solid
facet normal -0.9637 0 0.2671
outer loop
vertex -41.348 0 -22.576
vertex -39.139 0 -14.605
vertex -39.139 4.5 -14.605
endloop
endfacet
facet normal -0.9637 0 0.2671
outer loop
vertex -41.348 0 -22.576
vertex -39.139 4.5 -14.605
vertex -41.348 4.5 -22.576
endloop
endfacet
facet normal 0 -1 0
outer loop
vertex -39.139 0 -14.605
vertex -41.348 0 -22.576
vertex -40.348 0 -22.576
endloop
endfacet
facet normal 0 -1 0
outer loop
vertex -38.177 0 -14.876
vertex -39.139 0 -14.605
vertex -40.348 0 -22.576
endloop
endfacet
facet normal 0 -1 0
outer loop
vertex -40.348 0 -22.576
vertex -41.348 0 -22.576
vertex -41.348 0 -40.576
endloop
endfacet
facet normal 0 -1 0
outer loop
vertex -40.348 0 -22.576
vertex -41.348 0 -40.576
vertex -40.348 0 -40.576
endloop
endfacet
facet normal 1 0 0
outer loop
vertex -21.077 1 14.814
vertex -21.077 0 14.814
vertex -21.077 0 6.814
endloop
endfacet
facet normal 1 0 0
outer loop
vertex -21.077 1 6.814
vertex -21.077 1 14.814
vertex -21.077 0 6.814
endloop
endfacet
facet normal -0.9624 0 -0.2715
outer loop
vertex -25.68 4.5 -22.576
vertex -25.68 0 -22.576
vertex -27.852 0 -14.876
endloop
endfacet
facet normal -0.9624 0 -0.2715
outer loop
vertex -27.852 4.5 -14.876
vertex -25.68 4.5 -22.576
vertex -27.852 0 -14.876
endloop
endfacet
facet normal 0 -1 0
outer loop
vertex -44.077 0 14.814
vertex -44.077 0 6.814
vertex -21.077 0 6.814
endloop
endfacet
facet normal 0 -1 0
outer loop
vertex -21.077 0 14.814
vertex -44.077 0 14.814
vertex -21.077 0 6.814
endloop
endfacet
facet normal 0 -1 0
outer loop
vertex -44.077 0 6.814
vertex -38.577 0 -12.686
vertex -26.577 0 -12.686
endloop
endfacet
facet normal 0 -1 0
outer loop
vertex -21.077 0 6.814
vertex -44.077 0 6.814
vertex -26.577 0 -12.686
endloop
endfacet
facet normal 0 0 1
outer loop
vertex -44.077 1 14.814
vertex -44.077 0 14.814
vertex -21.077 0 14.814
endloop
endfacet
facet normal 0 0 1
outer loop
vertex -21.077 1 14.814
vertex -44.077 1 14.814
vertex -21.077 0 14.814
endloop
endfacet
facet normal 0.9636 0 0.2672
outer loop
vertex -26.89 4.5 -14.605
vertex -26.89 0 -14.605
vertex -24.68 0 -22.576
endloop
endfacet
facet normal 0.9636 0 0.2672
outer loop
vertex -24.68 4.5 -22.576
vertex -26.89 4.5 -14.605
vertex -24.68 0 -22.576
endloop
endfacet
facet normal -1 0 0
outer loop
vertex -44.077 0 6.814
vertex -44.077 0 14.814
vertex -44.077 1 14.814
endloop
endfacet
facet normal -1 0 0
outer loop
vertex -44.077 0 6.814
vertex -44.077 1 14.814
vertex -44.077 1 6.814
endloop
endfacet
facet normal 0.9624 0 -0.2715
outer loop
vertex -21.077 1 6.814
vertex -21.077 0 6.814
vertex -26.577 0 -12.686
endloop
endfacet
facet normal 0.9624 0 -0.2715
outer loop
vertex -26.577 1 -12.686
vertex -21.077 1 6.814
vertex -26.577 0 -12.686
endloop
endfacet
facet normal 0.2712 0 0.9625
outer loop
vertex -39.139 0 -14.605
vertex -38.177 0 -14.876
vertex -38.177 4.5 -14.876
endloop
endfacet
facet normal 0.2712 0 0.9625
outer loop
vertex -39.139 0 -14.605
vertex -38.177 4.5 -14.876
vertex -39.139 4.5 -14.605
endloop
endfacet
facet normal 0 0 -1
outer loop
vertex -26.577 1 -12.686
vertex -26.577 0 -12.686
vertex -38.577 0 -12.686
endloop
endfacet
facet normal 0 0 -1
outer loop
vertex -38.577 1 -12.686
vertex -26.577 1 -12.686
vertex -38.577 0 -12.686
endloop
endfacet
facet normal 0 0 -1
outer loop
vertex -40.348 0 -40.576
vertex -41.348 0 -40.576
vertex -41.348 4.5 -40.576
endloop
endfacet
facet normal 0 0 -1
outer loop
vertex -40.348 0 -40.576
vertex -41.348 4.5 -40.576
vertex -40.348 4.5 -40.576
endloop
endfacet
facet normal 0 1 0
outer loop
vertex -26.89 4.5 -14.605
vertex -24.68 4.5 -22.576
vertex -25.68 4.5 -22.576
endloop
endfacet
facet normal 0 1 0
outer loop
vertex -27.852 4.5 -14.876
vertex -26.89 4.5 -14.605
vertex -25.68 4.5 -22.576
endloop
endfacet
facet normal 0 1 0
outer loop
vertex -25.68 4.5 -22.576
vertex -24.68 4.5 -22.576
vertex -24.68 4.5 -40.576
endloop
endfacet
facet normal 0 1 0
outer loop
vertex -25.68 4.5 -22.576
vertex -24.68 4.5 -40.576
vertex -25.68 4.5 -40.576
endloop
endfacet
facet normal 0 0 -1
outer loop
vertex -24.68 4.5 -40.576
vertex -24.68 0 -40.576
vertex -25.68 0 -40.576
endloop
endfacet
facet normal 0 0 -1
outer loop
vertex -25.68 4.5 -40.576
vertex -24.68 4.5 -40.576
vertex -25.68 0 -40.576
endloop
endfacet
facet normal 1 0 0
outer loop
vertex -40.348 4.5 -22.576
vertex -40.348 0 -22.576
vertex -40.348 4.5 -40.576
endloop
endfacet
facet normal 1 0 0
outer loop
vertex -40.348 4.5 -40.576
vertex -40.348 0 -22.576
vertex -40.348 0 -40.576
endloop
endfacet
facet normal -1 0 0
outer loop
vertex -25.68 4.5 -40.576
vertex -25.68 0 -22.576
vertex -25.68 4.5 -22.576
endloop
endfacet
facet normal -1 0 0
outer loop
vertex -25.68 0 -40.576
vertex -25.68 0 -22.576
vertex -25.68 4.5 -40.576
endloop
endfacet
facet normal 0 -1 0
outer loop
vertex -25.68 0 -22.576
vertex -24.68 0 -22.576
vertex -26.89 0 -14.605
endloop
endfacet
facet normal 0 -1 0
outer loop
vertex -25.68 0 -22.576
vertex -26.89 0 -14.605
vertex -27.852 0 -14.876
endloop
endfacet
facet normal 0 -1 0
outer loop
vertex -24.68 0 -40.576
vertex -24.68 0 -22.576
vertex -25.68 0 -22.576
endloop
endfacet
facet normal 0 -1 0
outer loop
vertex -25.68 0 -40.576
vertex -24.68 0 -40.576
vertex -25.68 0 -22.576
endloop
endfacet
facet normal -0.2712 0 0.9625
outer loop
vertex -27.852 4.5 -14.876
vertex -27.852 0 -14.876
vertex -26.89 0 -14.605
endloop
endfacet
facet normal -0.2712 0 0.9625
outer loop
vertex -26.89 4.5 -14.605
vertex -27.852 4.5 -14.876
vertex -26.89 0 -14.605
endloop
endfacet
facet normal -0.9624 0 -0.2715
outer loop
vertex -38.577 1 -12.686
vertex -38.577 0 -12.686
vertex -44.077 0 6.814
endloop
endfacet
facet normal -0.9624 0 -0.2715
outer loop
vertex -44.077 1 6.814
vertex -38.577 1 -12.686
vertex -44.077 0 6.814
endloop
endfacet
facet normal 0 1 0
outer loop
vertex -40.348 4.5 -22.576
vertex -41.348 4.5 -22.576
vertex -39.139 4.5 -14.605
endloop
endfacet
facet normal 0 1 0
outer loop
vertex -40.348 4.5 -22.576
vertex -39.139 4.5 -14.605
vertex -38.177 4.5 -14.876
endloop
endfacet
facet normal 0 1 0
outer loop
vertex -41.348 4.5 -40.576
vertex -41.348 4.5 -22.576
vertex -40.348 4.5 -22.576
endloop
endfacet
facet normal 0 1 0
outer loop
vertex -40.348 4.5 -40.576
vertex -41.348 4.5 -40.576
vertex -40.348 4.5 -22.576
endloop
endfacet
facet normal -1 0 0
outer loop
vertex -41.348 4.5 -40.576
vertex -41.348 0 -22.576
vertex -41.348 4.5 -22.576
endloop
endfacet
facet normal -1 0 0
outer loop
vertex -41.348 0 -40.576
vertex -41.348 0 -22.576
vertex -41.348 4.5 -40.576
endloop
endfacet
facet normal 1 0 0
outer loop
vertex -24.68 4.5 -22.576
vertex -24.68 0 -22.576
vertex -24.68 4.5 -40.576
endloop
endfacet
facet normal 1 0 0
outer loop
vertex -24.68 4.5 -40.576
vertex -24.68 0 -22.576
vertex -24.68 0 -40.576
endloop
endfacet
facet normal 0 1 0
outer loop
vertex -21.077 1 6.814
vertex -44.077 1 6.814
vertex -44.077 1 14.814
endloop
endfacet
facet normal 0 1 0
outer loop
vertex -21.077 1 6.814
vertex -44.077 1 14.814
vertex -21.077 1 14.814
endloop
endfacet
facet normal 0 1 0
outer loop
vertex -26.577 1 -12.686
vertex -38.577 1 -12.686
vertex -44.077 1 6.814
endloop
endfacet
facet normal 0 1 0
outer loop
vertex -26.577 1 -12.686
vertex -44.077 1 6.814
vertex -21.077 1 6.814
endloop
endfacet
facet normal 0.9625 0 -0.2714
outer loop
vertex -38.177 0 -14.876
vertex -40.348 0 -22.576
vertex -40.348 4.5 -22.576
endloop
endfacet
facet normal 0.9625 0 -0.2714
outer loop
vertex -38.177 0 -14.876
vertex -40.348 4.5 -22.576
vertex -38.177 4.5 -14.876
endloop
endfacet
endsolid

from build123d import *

# Parameters (mm, degrees)
SKETCH1_W           = 11.5
SKETCH1_H           = 8
BOSS_EXTRUDE1_DEPTH = 1
SKETCH3_W           = 1
SKETCH3_H           = 18
BOSS_EXTRUDE2_DEPTH = 4.5


with BuildPart() as part:
    # Sketch1 → Boss-Extrude1 (new body)
    with BuildSketch(Plane(origin=(0, 0, 0), x_dir=(1, 0, 0), z_dir=(0, 1, 0))):
        Polygon((-38.577353254, 12.685924323), (-44.077353254, -6.814075677), (-32.577353254, -6.814075677), (-32.577353254, 12.685924323), align=None)
        Polygon((-32.577353254, 12.685924323), (-32.577353254, -6.814075677), (-21.077353254, -6.814075677), (-26.577353254, 12.685924323), align=None)
        with Locations((-26.827353254, -10.814075677)):
            Rectangle(SKETCH1_W, SKETCH1_H)
        with Locations((-38.327353254, -10.814075677)):
            Rectangle(SKETCH1_W, SKETCH1_H)
    extrude(amount=BOSS_EXTRUDE1_DEPTH)


with BuildPart() as body_2:
    # Sketch3 → Boss-Extrude2 (new body)
    with BuildSketch(Plane(origin=(0, 0, 0), x_dir=(1, 0, 0), z_dir=(0, 1, 0))):
        with Locations((-40.84836488, 31.575836794)):
            Rectangle(SKETCH3_W, SKETCH3_H)
        Polygon((-39.139133236, 14.604779221), (-41.34836488, 22.575836794), (-40.34836488, 22.575836794), (-38.17668356, 14.876239386), align=None)
    extrude(amount=BOSS_EXTRUDE2_DEPTH)


with BuildPart() as body_3:
    # Mirror1: mirrored copy
    add(body_2.part.mirror(Plane(origin=(-40.34836488, 4.5, 0), x_dir=(0, 0, 1), z_dir=(1, 0, 0))))


with BuildPart() as body_3_1:
    # Body-Move/Copy1: moved
    add(body_3.part.moved(Location((14.667988389, 0, 0))))


solid = Compound([part.part, body_2.part, body_3_1.part])
